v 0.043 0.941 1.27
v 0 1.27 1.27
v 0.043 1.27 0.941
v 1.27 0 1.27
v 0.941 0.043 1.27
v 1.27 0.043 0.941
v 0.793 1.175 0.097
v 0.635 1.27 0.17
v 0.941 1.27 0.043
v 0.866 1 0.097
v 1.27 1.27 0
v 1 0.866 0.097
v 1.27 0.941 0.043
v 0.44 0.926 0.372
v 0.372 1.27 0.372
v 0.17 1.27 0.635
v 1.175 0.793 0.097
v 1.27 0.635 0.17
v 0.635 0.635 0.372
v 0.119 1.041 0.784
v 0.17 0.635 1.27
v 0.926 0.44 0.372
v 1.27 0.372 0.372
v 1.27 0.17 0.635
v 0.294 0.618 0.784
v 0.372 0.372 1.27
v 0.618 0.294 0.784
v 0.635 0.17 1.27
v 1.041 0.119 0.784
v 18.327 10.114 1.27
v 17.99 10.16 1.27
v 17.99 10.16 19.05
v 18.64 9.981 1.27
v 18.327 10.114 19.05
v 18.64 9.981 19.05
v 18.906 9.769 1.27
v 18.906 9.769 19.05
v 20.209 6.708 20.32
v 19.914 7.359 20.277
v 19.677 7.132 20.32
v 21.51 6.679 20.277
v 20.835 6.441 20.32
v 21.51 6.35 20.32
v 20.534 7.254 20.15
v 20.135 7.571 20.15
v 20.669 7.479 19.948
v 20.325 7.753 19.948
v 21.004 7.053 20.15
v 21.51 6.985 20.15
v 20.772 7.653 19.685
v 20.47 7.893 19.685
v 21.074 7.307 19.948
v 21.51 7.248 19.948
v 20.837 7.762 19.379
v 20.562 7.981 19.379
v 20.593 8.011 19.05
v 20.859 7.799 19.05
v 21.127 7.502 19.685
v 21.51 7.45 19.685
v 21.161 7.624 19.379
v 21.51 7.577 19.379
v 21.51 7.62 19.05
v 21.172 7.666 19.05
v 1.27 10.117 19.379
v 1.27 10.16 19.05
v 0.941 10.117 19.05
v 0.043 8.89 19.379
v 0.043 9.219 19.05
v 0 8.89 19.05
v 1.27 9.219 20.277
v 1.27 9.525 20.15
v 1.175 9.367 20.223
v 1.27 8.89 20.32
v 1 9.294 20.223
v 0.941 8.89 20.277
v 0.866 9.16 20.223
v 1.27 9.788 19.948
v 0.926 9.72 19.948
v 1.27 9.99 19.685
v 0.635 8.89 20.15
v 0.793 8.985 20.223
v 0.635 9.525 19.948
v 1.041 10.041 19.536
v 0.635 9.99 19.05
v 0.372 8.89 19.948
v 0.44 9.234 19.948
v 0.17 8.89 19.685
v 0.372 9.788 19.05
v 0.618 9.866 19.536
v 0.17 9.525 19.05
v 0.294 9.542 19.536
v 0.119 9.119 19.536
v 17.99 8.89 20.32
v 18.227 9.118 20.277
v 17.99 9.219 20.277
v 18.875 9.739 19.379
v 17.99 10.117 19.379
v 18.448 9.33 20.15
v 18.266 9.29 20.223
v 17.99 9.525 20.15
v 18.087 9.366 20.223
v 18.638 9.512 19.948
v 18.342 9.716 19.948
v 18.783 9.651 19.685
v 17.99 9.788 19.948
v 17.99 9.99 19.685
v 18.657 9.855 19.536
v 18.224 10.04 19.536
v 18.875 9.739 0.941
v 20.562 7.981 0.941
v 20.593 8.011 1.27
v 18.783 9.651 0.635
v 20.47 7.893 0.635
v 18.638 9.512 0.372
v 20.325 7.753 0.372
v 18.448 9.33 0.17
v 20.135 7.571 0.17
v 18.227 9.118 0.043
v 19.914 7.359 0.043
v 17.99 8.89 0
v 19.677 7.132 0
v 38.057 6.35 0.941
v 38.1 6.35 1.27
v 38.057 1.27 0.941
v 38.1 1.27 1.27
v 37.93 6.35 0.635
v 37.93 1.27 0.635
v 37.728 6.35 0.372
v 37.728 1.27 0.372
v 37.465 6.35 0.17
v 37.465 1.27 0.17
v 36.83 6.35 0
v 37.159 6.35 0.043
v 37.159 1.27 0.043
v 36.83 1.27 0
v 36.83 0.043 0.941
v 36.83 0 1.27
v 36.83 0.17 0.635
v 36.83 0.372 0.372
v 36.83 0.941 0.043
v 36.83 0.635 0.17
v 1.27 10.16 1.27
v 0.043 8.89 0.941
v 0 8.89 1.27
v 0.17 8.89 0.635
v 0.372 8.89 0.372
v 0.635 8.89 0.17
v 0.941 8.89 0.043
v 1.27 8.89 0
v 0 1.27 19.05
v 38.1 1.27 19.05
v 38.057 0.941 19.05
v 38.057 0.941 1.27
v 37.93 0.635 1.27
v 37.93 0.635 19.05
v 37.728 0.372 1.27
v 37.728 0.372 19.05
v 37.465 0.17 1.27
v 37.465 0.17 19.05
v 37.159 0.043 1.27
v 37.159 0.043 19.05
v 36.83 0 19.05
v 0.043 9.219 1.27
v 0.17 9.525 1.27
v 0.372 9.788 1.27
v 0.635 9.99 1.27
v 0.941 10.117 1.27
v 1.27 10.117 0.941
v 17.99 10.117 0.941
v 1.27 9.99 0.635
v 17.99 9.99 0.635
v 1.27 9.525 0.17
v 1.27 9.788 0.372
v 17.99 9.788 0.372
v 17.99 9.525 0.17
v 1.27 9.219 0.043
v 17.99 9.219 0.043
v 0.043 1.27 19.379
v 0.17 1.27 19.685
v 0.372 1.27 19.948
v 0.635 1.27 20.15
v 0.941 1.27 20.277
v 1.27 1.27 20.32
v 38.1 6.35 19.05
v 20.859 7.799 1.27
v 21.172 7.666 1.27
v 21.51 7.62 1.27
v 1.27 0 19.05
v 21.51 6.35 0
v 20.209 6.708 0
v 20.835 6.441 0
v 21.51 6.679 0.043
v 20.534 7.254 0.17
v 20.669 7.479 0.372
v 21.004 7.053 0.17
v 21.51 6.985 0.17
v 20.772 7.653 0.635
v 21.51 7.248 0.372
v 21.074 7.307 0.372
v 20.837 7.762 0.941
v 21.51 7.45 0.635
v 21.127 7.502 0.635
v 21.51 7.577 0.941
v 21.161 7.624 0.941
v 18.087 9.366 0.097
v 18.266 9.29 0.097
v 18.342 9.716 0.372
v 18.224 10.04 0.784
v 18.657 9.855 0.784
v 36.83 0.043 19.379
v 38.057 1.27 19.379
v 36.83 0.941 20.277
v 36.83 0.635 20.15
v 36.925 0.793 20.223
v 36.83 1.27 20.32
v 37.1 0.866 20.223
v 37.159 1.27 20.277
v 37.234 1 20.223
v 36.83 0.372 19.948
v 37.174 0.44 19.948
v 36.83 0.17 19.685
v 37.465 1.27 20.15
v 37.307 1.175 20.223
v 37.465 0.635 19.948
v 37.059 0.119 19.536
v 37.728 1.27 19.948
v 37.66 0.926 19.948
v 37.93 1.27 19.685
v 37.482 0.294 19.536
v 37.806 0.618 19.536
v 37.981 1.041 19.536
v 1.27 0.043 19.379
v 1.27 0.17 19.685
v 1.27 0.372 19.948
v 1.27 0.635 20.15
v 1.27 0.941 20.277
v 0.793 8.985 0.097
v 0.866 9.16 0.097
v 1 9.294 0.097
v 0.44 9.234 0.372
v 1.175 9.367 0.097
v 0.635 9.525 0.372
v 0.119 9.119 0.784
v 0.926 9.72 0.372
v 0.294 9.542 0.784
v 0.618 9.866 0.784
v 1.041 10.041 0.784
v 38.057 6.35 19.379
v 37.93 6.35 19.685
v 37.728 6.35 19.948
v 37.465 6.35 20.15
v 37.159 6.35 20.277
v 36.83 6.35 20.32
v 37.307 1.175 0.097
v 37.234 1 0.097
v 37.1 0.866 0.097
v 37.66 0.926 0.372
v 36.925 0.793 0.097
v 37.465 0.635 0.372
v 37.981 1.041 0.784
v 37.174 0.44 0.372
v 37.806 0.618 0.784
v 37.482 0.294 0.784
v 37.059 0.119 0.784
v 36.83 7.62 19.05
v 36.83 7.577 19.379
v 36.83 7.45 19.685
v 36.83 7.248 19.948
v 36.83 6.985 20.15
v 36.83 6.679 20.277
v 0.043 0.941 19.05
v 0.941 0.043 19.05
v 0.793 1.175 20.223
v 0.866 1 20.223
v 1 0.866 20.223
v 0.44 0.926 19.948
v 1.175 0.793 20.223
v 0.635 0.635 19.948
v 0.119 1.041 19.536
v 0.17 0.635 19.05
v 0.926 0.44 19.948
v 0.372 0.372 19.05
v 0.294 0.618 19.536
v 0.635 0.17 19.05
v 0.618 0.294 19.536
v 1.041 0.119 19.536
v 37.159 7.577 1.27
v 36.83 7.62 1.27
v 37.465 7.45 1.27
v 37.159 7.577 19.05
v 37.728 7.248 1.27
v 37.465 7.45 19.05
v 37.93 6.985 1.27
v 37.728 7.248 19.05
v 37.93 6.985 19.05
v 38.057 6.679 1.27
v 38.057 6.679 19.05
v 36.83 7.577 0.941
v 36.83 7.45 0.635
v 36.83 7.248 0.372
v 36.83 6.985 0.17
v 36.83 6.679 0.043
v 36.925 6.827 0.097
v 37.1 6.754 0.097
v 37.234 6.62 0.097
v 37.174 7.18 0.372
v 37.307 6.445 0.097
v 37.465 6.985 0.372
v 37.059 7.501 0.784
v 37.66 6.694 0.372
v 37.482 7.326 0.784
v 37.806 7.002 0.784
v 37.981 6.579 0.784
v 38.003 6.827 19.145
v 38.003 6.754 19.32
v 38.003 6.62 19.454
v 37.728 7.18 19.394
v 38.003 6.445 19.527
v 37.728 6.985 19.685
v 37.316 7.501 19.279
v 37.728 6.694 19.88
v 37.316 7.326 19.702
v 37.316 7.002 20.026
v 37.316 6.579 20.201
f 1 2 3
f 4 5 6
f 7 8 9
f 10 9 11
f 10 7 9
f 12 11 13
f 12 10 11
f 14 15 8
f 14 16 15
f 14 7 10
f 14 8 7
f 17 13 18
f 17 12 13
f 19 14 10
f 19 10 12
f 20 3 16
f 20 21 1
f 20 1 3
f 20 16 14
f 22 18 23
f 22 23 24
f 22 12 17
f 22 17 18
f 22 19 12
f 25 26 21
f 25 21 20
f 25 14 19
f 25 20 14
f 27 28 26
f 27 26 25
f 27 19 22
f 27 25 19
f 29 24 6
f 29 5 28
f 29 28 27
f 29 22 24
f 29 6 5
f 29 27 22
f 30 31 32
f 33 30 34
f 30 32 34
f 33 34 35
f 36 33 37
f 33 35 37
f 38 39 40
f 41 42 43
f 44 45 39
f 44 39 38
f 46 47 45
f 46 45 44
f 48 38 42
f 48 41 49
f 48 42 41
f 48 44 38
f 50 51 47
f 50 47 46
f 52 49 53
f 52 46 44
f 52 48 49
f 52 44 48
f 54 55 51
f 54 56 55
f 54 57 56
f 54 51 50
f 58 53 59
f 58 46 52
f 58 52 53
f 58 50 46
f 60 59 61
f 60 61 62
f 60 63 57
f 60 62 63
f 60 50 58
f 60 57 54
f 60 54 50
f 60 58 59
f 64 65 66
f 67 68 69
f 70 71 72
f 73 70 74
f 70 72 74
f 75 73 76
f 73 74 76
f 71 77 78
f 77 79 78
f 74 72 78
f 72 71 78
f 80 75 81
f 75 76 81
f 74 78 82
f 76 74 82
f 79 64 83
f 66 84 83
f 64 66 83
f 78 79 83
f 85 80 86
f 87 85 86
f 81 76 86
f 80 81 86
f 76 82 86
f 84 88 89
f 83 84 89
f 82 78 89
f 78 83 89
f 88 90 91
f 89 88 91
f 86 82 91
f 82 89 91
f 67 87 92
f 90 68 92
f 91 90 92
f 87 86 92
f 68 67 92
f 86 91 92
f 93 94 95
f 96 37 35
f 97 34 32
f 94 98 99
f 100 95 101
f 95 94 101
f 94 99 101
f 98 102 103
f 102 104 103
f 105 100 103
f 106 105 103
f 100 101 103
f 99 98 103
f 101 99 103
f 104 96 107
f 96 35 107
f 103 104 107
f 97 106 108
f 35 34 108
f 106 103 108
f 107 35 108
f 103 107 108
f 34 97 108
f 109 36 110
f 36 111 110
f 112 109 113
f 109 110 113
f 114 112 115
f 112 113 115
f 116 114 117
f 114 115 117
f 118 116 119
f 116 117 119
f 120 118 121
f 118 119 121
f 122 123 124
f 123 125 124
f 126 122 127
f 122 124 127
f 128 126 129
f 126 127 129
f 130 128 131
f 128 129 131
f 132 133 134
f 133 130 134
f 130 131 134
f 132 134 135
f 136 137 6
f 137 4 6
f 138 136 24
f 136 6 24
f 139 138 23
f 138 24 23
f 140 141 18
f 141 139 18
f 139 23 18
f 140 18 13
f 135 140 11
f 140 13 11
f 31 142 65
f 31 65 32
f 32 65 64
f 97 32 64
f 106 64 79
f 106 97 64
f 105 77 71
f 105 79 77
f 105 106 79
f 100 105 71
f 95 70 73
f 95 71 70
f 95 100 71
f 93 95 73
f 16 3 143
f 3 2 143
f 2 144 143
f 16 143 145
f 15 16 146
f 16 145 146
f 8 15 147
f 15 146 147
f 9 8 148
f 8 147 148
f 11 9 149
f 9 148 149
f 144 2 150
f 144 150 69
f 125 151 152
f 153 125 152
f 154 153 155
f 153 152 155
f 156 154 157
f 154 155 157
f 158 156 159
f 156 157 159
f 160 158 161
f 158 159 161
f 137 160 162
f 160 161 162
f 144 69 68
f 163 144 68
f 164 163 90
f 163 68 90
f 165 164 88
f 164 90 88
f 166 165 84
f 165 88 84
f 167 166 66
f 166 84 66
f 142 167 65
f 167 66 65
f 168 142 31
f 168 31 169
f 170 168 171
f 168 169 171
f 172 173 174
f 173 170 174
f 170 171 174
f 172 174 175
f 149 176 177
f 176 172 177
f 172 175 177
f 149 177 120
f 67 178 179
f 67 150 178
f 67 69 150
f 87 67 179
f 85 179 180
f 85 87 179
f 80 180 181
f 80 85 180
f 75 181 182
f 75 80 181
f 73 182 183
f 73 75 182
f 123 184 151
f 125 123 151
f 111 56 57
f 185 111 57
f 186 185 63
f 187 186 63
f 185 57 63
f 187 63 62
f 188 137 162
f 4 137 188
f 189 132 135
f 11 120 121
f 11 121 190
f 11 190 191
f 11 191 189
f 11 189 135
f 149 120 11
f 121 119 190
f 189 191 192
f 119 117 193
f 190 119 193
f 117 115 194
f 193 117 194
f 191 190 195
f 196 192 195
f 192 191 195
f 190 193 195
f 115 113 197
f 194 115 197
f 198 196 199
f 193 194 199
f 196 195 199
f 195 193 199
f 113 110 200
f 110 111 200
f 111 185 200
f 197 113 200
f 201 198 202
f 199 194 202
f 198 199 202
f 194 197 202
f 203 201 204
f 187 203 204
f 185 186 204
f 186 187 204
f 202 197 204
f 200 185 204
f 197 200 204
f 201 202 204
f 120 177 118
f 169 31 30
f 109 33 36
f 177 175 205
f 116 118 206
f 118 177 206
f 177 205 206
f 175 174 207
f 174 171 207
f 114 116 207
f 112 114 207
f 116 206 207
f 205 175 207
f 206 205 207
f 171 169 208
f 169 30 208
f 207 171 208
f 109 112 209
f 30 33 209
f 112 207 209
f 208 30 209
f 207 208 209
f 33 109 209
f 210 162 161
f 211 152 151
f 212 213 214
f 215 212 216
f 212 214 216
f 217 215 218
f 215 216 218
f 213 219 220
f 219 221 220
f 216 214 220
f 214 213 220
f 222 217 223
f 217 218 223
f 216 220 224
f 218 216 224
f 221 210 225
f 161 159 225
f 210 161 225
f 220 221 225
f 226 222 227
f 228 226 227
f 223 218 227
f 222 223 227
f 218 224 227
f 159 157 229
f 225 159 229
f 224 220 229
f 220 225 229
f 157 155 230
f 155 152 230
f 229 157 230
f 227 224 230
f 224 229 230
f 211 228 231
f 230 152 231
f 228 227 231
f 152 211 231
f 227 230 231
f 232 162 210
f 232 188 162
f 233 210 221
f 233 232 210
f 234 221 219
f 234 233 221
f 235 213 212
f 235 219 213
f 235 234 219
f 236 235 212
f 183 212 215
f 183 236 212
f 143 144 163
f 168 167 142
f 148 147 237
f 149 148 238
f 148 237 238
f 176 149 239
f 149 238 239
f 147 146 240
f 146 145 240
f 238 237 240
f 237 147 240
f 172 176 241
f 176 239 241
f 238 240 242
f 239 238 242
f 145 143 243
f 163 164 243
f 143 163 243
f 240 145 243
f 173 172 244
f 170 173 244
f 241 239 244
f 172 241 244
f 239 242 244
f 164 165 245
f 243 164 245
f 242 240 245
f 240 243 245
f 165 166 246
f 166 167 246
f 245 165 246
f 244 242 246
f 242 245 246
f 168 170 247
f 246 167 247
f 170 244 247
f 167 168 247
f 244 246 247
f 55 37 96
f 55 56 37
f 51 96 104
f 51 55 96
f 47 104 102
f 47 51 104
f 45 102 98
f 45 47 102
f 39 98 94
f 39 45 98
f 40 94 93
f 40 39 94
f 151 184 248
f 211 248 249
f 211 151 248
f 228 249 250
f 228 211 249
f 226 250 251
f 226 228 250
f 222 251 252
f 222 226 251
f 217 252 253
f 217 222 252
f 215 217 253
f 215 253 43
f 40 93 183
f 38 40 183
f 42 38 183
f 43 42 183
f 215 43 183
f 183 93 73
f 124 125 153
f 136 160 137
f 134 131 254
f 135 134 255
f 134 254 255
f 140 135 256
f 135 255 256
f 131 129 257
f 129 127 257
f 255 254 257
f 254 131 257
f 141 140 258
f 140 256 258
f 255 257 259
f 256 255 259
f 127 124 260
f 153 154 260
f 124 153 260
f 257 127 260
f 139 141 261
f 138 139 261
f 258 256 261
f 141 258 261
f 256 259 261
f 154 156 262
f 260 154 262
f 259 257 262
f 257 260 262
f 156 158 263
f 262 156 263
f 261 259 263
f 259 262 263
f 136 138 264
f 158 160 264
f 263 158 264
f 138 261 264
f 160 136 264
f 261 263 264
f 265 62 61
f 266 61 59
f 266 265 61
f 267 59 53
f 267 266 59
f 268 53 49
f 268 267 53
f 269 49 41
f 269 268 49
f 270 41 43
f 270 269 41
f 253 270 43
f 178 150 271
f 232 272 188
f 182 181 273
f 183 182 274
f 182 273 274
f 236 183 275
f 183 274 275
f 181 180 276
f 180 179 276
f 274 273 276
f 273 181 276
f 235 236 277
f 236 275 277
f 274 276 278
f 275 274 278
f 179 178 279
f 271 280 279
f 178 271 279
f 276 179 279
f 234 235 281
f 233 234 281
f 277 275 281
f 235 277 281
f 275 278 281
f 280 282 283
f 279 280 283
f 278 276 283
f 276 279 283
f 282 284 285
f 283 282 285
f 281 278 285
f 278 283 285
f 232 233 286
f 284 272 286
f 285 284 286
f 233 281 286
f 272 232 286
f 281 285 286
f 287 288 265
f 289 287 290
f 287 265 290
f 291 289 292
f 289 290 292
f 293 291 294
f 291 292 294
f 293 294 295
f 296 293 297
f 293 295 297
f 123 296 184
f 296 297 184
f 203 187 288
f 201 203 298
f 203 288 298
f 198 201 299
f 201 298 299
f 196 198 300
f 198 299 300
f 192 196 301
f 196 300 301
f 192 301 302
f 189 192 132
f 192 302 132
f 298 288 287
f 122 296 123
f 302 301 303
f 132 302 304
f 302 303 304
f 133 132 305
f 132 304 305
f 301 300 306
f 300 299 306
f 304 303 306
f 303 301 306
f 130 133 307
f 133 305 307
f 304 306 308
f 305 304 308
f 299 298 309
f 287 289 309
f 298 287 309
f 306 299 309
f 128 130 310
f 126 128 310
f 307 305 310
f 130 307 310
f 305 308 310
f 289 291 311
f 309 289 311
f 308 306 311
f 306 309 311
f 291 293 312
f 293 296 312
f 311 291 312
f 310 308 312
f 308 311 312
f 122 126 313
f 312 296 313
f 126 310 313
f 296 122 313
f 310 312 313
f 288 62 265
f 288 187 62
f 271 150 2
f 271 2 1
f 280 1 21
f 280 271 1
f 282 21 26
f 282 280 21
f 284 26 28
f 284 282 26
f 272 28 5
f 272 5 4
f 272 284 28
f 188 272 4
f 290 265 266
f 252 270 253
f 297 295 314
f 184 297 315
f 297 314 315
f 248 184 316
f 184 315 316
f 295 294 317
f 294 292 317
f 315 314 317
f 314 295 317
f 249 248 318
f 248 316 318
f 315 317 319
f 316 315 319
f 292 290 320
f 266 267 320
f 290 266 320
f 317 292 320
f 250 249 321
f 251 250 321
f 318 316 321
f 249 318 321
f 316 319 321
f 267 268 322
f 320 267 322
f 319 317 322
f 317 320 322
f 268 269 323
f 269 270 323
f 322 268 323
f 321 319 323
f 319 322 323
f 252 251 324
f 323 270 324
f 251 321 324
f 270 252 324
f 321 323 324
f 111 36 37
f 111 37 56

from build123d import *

# Parameters (mm, degrees)
BOSS_EXTRUDE1_DEPTH = 20.32
FILLET1_R           = 1.27


with BuildPart() as part:
    # Sketch1 → Boss-Extrude1 (new body)
    with BuildSketch(Plane.XY):
        Polygon((0, 0), (0, 10.16), (18.531128405, 10.16), (20.968059336, 7.62), (38.1, 7.62), (38.1, 0), align=None)
    extrude(amount=BOSS_EXTRUDE1_DEPTH)

    # Fillet1
    fillet1_edges = [part.edges().sort_by_distance(p)[0] for p in [
        (29.534029668, 7.62, 20.32),
        (0, 0, 10.16),
        (0, 10.16, 10.16),
        (18.531128405, 10.16, 10.16),
        (20.968059336, 7.62, 10.16),
        (38.1, 7.62, 10.16),
        (38.1, 0, 10.16),
        (19.74959387, 8.89, 20.32),
        (9.265564202, 10.16, 20.32),
        (0, 5.08, 20.32),
        (19.05, 0, 20.32),
        (0, 5.08, 0),
        (9.265564202, 10.16, 0),
        (19.74959387, 8.89, 0),
        (38.1, 3.81, 20.32),
        (29.534029668, 7.62, 0),
        (38.1, 3.81, 0),
        (19.05, 0, 0),
    ]]
    fillet(fillet1_edges, radius=FILLET1_R)


solid = part.part
